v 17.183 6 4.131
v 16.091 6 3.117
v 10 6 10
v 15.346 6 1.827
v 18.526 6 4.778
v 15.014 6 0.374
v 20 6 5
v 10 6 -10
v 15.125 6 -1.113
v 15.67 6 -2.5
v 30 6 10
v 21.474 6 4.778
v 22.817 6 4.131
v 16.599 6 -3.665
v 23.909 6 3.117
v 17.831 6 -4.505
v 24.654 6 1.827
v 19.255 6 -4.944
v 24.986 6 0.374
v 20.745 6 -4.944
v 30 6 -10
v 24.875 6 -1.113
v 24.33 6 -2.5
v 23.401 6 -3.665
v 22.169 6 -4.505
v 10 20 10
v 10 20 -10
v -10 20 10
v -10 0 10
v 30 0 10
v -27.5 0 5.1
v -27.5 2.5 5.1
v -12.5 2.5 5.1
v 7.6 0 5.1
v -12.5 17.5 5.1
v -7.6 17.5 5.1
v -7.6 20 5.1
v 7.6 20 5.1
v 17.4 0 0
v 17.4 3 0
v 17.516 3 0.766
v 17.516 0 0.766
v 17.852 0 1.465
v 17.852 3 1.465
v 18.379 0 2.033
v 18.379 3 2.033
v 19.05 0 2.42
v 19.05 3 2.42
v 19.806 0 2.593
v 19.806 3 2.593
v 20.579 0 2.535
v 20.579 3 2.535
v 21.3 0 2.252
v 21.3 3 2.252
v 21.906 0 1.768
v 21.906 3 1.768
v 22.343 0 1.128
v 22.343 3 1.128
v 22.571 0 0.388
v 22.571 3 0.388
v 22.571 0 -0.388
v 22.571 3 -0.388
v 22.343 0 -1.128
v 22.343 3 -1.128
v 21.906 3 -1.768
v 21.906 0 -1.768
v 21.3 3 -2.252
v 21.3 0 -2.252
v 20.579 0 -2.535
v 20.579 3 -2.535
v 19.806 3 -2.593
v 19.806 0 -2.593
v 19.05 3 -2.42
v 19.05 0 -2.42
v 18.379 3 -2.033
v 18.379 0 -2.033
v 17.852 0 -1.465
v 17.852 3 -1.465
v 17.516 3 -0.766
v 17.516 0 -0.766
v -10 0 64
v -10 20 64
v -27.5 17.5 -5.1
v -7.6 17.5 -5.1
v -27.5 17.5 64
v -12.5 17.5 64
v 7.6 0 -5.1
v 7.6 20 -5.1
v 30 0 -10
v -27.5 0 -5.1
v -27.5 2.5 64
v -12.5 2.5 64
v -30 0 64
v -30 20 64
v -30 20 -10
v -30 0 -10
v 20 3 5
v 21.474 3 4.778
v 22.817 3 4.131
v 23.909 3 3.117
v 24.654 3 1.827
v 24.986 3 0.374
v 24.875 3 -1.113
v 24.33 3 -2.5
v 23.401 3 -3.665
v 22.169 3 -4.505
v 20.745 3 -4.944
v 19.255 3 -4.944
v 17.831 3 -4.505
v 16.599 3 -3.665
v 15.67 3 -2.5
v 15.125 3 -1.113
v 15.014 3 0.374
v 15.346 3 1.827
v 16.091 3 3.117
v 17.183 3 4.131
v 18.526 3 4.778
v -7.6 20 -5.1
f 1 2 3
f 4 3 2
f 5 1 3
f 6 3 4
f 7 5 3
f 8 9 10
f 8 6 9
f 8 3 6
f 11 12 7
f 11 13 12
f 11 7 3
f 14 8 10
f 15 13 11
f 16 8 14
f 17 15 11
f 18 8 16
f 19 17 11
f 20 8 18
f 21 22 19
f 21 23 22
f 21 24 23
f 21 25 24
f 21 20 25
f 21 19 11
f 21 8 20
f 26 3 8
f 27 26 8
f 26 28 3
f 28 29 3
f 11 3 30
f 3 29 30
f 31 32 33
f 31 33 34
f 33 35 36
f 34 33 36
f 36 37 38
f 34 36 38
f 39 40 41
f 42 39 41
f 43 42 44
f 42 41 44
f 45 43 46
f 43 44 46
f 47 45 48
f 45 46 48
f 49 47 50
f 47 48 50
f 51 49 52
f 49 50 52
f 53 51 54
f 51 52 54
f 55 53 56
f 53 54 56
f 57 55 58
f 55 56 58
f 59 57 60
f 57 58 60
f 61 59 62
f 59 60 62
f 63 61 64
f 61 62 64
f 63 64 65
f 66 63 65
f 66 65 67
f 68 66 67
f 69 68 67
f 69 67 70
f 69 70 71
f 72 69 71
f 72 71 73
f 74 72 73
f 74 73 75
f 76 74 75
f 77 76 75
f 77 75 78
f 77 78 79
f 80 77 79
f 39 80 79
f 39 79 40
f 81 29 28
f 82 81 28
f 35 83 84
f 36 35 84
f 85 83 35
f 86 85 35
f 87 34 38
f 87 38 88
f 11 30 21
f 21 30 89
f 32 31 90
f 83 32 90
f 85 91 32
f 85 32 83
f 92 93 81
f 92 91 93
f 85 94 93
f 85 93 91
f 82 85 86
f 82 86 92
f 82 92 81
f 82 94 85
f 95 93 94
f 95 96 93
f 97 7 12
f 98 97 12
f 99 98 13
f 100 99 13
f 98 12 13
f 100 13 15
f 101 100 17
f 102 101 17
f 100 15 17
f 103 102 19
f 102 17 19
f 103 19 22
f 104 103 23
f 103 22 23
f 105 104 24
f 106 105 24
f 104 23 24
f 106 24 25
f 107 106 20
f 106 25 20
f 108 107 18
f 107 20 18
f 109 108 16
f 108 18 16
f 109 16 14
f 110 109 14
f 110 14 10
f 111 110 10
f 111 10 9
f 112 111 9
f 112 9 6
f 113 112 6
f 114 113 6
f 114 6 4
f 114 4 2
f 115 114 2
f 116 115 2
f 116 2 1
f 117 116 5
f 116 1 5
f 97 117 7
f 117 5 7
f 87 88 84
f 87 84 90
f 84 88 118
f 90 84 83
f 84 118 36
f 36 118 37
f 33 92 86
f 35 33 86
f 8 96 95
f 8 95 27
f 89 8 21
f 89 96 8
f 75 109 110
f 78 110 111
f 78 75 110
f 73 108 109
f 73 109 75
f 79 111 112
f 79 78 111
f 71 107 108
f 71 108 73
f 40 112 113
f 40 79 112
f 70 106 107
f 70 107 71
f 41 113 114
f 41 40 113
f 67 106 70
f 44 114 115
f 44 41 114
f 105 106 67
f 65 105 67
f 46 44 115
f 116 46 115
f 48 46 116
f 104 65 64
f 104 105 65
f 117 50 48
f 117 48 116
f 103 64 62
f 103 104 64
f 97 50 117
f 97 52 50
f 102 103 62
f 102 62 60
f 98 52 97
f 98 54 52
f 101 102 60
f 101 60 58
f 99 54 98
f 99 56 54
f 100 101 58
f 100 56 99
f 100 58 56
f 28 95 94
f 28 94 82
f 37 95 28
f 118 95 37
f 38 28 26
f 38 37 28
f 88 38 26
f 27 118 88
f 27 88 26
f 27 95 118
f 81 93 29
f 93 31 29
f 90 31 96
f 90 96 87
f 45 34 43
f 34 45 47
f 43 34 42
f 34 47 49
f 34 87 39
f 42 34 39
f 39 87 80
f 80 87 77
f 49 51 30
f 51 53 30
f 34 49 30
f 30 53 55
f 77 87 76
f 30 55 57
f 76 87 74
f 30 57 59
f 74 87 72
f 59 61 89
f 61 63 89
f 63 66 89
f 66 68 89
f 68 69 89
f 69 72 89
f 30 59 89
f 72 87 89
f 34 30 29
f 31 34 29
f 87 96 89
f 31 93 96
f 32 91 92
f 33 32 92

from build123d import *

# Parameters (mm, degrees)
SKETCH_1_W          = 60
SKETCH_1_H          = 20
EXTRUDE_1_DEPTH     = 6
CUT_EXTRUDE_1_DEPTH = 6
SKETCH_3_R          = 5
CUT_EXTRUDE_2_DEPTH = 3
EXTRUDE_2_DEPTH     = 14
CUT_EXTRUDE_3_DEPTH = 20
SKETCH_6_W          = 20
SKETCH_6_H          = 20
EXTRUDE_3_DEPTH     = 14
SKETCH_7_W          = 20
SKETCH_7_H          = 20
EXTRUDE_4_DEPTH     = 54
SKETCH_8_W          = 15
SKETCH_8_H          = 15
CUT_EXTRUDE_4_DEPTH = 64
SKETCH_9_W          = 19.9
SKETCH_9_H          = 10.2
CUT_EXTRUDE_5_DEPTH = 17.5
SKETCH_11_W         = 19.9
SKETCH_11_H         = 10.2
CUT_EXTRUDE_6_DEPTH = 15
SKETCH_12_W         = 35.1
SKETCH_12_H         = 10.2
EXTRUDE_5_DEPTH     = 2.5
CUT_EXTRUDE_7_DEPTH = 2.5


with BuildPart() as part:
    # 草图1 → 凸台-拉伸1 (new body)
    with BuildSketch(Plane(origin=(0, 0, 0), x_dir=(1, 0, 0), z_dir=(0, 1, 0))):
        Rectangle(SKETCH_1_W, SKETCH_1_H)
    extrude(amount=EXTRUDE_1_DEPTH)

    # 草图2 → 切除-拉伸1 (cut)
    with BuildSketch(Plane(origin=(0, 6, 0), x_dir=(1, 0, 0), z_dir=(0, 1, 0))):
        with BuildLine():
            ThreePointArc((22.6, 0), (20, 2.6), (17.4, 0))
            Line((17.4, 0), (22.6, 0))
        make_face()
        with BuildLine():
            Line((22.6, 0), (17.4, 0))
            ThreePointArc((17.4, 0), (20, -2.6), (22.6, 0))
        make_face()
    extrude(amount=-CUT_EXTRUDE_1_DEPTH, mode=Mode.SUBTRACT)

    # 草图3 → 切除-拉伸2 (cut)
    with BuildSketch(Plane(origin=(0, 6, 0), x_dir=(1, 0, 0), z_dir=(0, 1, 0))):
        with Locations(Location((20, 0, 0), (0, 0, 270))):
            Circle(SKETCH_3_R)
    extrude(amount=-CUT_EXTRUDE_2_DEPTH, mode=Mode.SUBTRACT)

    # 草图4 → 凸台-拉伸2 (add)
    with BuildSketch(Plane(origin=(0, 6, 0), x_dir=(1, 0, 0), z_dir=(0, 1, 0))):
        Polygon((-10, -10), (0, -10), (10, -10), (10, 10), (0, 10), (-10, 10), align=None)
    extrude(amount=EXTRUDE_2_DEPTH)

    # 草图5 → 切除-拉伸3 (cut)
    with BuildSketch(Plane(origin=(0, 20, 0), x_dir=(1, 0, 0), z_dir=(0, 1, 0))):
        Polygon((-7.6, 0), (0, 0), (7.6, 0), (7.6, 5.1), (-7.6, 5.1), align=None)
        Polygon((7.6, 0), (0, 0), (-7.6, 0), (-7.6, -5.1), (7.6, -5.1), align=None)
    extrude(amount=-CUT_EXTRUDE_3_DEPTH, mode=Mode.SUBTRACT)

    # 草图6 → 凸台-拉伸3 (add)
    with BuildSketch(Plane(origin=(0, 6, 0), x_dir=(1, 0, 0), z_dir=(0, 1, 0))):
        with Locations((-20, 0)):
            Rectangle(SKETCH_6_W, SKETCH_6_H)
    extrude(amount=EXTRUDE_3_DEPTH)

    # 草图7 → 凸台-拉伸4 (add)
    with BuildSketch(Plane.XY.offset(10)):
        with Locations((-20, 10)):
            Rectangle(SKETCH_7_W, SKETCH_7_H)
    extrude(amount=EXTRUDE_4_DEPTH)

    # 草图8 → 切除-拉伸4 (cut)
    with BuildSketch(Plane.XY.offset(64)):
        with Locations((-20, 10)):
            Rectangle(SKETCH_8_W, SKETCH_8_H)
    extrude(amount=-CUT_EXTRUDE_4_DEPTH, mode=Mode.SUBTRACT)

    # 草图9 → 切除-拉伸5 (cut)
    with BuildSketch(Plane(origin=(0, 20, 0), x_dir=(1, 0, 0), z_dir=(0, 1, 0))):
        with Locations((-17.55, 0)):
            Rectangle(SKETCH_9_W, SKETCH_9_H)
    extrude(amount=-CUT_EXTRUDE_5_DEPTH, mode=Mode.SUBTRACT)

    # 草图11 → 切除-拉伸6 (cut)
    with BuildSketch(Plane(origin=(0, 2.5, 0), x_dir=(1, 0, 0), z_dir=(0, 1, 0))):
        with Locations((-17.55, 0)):
            Rectangle(SKETCH_11_W, SKETCH_11_H)
    extrude(amount=-CUT_EXTRUDE_6_DEPTH, mode=Mode.SUBTRACT)

    # 草图12 → 凸台-拉伸5 (add)
    with BuildSketch(Plane(origin=(0, 20, 0), x_dir=(1, 0, 0), z_dir=(0, 1, 0))):
        with Locations((-9.95, 0)):
            Rectangle(SKETCH_12_W, SKETCH_12_H)
    extrude(amount=-EXTRUDE_5_DEPTH)

    # 草图13 → 切除-拉伸7 (cut)
    with BuildSketch(Plane(origin=(0, 20, 0), x_dir=(1, 0, 0), z_dir=(0, 1, 0))):
        Polygon((-7.6, 0), (0, 0), (7.6, 0), (7.6, 5.1), (-7.6, 5.1), align=None)
        Polygon((7.6, 0), (0, 0), (-7.6, 0), (-7.6, -5.1), (7.6, -5.1), align=None)
    extrude(amount=-CUT_EXTRUDE_7_DEPTH, mode=Mode.SUBTRACT)


solid = part.part
